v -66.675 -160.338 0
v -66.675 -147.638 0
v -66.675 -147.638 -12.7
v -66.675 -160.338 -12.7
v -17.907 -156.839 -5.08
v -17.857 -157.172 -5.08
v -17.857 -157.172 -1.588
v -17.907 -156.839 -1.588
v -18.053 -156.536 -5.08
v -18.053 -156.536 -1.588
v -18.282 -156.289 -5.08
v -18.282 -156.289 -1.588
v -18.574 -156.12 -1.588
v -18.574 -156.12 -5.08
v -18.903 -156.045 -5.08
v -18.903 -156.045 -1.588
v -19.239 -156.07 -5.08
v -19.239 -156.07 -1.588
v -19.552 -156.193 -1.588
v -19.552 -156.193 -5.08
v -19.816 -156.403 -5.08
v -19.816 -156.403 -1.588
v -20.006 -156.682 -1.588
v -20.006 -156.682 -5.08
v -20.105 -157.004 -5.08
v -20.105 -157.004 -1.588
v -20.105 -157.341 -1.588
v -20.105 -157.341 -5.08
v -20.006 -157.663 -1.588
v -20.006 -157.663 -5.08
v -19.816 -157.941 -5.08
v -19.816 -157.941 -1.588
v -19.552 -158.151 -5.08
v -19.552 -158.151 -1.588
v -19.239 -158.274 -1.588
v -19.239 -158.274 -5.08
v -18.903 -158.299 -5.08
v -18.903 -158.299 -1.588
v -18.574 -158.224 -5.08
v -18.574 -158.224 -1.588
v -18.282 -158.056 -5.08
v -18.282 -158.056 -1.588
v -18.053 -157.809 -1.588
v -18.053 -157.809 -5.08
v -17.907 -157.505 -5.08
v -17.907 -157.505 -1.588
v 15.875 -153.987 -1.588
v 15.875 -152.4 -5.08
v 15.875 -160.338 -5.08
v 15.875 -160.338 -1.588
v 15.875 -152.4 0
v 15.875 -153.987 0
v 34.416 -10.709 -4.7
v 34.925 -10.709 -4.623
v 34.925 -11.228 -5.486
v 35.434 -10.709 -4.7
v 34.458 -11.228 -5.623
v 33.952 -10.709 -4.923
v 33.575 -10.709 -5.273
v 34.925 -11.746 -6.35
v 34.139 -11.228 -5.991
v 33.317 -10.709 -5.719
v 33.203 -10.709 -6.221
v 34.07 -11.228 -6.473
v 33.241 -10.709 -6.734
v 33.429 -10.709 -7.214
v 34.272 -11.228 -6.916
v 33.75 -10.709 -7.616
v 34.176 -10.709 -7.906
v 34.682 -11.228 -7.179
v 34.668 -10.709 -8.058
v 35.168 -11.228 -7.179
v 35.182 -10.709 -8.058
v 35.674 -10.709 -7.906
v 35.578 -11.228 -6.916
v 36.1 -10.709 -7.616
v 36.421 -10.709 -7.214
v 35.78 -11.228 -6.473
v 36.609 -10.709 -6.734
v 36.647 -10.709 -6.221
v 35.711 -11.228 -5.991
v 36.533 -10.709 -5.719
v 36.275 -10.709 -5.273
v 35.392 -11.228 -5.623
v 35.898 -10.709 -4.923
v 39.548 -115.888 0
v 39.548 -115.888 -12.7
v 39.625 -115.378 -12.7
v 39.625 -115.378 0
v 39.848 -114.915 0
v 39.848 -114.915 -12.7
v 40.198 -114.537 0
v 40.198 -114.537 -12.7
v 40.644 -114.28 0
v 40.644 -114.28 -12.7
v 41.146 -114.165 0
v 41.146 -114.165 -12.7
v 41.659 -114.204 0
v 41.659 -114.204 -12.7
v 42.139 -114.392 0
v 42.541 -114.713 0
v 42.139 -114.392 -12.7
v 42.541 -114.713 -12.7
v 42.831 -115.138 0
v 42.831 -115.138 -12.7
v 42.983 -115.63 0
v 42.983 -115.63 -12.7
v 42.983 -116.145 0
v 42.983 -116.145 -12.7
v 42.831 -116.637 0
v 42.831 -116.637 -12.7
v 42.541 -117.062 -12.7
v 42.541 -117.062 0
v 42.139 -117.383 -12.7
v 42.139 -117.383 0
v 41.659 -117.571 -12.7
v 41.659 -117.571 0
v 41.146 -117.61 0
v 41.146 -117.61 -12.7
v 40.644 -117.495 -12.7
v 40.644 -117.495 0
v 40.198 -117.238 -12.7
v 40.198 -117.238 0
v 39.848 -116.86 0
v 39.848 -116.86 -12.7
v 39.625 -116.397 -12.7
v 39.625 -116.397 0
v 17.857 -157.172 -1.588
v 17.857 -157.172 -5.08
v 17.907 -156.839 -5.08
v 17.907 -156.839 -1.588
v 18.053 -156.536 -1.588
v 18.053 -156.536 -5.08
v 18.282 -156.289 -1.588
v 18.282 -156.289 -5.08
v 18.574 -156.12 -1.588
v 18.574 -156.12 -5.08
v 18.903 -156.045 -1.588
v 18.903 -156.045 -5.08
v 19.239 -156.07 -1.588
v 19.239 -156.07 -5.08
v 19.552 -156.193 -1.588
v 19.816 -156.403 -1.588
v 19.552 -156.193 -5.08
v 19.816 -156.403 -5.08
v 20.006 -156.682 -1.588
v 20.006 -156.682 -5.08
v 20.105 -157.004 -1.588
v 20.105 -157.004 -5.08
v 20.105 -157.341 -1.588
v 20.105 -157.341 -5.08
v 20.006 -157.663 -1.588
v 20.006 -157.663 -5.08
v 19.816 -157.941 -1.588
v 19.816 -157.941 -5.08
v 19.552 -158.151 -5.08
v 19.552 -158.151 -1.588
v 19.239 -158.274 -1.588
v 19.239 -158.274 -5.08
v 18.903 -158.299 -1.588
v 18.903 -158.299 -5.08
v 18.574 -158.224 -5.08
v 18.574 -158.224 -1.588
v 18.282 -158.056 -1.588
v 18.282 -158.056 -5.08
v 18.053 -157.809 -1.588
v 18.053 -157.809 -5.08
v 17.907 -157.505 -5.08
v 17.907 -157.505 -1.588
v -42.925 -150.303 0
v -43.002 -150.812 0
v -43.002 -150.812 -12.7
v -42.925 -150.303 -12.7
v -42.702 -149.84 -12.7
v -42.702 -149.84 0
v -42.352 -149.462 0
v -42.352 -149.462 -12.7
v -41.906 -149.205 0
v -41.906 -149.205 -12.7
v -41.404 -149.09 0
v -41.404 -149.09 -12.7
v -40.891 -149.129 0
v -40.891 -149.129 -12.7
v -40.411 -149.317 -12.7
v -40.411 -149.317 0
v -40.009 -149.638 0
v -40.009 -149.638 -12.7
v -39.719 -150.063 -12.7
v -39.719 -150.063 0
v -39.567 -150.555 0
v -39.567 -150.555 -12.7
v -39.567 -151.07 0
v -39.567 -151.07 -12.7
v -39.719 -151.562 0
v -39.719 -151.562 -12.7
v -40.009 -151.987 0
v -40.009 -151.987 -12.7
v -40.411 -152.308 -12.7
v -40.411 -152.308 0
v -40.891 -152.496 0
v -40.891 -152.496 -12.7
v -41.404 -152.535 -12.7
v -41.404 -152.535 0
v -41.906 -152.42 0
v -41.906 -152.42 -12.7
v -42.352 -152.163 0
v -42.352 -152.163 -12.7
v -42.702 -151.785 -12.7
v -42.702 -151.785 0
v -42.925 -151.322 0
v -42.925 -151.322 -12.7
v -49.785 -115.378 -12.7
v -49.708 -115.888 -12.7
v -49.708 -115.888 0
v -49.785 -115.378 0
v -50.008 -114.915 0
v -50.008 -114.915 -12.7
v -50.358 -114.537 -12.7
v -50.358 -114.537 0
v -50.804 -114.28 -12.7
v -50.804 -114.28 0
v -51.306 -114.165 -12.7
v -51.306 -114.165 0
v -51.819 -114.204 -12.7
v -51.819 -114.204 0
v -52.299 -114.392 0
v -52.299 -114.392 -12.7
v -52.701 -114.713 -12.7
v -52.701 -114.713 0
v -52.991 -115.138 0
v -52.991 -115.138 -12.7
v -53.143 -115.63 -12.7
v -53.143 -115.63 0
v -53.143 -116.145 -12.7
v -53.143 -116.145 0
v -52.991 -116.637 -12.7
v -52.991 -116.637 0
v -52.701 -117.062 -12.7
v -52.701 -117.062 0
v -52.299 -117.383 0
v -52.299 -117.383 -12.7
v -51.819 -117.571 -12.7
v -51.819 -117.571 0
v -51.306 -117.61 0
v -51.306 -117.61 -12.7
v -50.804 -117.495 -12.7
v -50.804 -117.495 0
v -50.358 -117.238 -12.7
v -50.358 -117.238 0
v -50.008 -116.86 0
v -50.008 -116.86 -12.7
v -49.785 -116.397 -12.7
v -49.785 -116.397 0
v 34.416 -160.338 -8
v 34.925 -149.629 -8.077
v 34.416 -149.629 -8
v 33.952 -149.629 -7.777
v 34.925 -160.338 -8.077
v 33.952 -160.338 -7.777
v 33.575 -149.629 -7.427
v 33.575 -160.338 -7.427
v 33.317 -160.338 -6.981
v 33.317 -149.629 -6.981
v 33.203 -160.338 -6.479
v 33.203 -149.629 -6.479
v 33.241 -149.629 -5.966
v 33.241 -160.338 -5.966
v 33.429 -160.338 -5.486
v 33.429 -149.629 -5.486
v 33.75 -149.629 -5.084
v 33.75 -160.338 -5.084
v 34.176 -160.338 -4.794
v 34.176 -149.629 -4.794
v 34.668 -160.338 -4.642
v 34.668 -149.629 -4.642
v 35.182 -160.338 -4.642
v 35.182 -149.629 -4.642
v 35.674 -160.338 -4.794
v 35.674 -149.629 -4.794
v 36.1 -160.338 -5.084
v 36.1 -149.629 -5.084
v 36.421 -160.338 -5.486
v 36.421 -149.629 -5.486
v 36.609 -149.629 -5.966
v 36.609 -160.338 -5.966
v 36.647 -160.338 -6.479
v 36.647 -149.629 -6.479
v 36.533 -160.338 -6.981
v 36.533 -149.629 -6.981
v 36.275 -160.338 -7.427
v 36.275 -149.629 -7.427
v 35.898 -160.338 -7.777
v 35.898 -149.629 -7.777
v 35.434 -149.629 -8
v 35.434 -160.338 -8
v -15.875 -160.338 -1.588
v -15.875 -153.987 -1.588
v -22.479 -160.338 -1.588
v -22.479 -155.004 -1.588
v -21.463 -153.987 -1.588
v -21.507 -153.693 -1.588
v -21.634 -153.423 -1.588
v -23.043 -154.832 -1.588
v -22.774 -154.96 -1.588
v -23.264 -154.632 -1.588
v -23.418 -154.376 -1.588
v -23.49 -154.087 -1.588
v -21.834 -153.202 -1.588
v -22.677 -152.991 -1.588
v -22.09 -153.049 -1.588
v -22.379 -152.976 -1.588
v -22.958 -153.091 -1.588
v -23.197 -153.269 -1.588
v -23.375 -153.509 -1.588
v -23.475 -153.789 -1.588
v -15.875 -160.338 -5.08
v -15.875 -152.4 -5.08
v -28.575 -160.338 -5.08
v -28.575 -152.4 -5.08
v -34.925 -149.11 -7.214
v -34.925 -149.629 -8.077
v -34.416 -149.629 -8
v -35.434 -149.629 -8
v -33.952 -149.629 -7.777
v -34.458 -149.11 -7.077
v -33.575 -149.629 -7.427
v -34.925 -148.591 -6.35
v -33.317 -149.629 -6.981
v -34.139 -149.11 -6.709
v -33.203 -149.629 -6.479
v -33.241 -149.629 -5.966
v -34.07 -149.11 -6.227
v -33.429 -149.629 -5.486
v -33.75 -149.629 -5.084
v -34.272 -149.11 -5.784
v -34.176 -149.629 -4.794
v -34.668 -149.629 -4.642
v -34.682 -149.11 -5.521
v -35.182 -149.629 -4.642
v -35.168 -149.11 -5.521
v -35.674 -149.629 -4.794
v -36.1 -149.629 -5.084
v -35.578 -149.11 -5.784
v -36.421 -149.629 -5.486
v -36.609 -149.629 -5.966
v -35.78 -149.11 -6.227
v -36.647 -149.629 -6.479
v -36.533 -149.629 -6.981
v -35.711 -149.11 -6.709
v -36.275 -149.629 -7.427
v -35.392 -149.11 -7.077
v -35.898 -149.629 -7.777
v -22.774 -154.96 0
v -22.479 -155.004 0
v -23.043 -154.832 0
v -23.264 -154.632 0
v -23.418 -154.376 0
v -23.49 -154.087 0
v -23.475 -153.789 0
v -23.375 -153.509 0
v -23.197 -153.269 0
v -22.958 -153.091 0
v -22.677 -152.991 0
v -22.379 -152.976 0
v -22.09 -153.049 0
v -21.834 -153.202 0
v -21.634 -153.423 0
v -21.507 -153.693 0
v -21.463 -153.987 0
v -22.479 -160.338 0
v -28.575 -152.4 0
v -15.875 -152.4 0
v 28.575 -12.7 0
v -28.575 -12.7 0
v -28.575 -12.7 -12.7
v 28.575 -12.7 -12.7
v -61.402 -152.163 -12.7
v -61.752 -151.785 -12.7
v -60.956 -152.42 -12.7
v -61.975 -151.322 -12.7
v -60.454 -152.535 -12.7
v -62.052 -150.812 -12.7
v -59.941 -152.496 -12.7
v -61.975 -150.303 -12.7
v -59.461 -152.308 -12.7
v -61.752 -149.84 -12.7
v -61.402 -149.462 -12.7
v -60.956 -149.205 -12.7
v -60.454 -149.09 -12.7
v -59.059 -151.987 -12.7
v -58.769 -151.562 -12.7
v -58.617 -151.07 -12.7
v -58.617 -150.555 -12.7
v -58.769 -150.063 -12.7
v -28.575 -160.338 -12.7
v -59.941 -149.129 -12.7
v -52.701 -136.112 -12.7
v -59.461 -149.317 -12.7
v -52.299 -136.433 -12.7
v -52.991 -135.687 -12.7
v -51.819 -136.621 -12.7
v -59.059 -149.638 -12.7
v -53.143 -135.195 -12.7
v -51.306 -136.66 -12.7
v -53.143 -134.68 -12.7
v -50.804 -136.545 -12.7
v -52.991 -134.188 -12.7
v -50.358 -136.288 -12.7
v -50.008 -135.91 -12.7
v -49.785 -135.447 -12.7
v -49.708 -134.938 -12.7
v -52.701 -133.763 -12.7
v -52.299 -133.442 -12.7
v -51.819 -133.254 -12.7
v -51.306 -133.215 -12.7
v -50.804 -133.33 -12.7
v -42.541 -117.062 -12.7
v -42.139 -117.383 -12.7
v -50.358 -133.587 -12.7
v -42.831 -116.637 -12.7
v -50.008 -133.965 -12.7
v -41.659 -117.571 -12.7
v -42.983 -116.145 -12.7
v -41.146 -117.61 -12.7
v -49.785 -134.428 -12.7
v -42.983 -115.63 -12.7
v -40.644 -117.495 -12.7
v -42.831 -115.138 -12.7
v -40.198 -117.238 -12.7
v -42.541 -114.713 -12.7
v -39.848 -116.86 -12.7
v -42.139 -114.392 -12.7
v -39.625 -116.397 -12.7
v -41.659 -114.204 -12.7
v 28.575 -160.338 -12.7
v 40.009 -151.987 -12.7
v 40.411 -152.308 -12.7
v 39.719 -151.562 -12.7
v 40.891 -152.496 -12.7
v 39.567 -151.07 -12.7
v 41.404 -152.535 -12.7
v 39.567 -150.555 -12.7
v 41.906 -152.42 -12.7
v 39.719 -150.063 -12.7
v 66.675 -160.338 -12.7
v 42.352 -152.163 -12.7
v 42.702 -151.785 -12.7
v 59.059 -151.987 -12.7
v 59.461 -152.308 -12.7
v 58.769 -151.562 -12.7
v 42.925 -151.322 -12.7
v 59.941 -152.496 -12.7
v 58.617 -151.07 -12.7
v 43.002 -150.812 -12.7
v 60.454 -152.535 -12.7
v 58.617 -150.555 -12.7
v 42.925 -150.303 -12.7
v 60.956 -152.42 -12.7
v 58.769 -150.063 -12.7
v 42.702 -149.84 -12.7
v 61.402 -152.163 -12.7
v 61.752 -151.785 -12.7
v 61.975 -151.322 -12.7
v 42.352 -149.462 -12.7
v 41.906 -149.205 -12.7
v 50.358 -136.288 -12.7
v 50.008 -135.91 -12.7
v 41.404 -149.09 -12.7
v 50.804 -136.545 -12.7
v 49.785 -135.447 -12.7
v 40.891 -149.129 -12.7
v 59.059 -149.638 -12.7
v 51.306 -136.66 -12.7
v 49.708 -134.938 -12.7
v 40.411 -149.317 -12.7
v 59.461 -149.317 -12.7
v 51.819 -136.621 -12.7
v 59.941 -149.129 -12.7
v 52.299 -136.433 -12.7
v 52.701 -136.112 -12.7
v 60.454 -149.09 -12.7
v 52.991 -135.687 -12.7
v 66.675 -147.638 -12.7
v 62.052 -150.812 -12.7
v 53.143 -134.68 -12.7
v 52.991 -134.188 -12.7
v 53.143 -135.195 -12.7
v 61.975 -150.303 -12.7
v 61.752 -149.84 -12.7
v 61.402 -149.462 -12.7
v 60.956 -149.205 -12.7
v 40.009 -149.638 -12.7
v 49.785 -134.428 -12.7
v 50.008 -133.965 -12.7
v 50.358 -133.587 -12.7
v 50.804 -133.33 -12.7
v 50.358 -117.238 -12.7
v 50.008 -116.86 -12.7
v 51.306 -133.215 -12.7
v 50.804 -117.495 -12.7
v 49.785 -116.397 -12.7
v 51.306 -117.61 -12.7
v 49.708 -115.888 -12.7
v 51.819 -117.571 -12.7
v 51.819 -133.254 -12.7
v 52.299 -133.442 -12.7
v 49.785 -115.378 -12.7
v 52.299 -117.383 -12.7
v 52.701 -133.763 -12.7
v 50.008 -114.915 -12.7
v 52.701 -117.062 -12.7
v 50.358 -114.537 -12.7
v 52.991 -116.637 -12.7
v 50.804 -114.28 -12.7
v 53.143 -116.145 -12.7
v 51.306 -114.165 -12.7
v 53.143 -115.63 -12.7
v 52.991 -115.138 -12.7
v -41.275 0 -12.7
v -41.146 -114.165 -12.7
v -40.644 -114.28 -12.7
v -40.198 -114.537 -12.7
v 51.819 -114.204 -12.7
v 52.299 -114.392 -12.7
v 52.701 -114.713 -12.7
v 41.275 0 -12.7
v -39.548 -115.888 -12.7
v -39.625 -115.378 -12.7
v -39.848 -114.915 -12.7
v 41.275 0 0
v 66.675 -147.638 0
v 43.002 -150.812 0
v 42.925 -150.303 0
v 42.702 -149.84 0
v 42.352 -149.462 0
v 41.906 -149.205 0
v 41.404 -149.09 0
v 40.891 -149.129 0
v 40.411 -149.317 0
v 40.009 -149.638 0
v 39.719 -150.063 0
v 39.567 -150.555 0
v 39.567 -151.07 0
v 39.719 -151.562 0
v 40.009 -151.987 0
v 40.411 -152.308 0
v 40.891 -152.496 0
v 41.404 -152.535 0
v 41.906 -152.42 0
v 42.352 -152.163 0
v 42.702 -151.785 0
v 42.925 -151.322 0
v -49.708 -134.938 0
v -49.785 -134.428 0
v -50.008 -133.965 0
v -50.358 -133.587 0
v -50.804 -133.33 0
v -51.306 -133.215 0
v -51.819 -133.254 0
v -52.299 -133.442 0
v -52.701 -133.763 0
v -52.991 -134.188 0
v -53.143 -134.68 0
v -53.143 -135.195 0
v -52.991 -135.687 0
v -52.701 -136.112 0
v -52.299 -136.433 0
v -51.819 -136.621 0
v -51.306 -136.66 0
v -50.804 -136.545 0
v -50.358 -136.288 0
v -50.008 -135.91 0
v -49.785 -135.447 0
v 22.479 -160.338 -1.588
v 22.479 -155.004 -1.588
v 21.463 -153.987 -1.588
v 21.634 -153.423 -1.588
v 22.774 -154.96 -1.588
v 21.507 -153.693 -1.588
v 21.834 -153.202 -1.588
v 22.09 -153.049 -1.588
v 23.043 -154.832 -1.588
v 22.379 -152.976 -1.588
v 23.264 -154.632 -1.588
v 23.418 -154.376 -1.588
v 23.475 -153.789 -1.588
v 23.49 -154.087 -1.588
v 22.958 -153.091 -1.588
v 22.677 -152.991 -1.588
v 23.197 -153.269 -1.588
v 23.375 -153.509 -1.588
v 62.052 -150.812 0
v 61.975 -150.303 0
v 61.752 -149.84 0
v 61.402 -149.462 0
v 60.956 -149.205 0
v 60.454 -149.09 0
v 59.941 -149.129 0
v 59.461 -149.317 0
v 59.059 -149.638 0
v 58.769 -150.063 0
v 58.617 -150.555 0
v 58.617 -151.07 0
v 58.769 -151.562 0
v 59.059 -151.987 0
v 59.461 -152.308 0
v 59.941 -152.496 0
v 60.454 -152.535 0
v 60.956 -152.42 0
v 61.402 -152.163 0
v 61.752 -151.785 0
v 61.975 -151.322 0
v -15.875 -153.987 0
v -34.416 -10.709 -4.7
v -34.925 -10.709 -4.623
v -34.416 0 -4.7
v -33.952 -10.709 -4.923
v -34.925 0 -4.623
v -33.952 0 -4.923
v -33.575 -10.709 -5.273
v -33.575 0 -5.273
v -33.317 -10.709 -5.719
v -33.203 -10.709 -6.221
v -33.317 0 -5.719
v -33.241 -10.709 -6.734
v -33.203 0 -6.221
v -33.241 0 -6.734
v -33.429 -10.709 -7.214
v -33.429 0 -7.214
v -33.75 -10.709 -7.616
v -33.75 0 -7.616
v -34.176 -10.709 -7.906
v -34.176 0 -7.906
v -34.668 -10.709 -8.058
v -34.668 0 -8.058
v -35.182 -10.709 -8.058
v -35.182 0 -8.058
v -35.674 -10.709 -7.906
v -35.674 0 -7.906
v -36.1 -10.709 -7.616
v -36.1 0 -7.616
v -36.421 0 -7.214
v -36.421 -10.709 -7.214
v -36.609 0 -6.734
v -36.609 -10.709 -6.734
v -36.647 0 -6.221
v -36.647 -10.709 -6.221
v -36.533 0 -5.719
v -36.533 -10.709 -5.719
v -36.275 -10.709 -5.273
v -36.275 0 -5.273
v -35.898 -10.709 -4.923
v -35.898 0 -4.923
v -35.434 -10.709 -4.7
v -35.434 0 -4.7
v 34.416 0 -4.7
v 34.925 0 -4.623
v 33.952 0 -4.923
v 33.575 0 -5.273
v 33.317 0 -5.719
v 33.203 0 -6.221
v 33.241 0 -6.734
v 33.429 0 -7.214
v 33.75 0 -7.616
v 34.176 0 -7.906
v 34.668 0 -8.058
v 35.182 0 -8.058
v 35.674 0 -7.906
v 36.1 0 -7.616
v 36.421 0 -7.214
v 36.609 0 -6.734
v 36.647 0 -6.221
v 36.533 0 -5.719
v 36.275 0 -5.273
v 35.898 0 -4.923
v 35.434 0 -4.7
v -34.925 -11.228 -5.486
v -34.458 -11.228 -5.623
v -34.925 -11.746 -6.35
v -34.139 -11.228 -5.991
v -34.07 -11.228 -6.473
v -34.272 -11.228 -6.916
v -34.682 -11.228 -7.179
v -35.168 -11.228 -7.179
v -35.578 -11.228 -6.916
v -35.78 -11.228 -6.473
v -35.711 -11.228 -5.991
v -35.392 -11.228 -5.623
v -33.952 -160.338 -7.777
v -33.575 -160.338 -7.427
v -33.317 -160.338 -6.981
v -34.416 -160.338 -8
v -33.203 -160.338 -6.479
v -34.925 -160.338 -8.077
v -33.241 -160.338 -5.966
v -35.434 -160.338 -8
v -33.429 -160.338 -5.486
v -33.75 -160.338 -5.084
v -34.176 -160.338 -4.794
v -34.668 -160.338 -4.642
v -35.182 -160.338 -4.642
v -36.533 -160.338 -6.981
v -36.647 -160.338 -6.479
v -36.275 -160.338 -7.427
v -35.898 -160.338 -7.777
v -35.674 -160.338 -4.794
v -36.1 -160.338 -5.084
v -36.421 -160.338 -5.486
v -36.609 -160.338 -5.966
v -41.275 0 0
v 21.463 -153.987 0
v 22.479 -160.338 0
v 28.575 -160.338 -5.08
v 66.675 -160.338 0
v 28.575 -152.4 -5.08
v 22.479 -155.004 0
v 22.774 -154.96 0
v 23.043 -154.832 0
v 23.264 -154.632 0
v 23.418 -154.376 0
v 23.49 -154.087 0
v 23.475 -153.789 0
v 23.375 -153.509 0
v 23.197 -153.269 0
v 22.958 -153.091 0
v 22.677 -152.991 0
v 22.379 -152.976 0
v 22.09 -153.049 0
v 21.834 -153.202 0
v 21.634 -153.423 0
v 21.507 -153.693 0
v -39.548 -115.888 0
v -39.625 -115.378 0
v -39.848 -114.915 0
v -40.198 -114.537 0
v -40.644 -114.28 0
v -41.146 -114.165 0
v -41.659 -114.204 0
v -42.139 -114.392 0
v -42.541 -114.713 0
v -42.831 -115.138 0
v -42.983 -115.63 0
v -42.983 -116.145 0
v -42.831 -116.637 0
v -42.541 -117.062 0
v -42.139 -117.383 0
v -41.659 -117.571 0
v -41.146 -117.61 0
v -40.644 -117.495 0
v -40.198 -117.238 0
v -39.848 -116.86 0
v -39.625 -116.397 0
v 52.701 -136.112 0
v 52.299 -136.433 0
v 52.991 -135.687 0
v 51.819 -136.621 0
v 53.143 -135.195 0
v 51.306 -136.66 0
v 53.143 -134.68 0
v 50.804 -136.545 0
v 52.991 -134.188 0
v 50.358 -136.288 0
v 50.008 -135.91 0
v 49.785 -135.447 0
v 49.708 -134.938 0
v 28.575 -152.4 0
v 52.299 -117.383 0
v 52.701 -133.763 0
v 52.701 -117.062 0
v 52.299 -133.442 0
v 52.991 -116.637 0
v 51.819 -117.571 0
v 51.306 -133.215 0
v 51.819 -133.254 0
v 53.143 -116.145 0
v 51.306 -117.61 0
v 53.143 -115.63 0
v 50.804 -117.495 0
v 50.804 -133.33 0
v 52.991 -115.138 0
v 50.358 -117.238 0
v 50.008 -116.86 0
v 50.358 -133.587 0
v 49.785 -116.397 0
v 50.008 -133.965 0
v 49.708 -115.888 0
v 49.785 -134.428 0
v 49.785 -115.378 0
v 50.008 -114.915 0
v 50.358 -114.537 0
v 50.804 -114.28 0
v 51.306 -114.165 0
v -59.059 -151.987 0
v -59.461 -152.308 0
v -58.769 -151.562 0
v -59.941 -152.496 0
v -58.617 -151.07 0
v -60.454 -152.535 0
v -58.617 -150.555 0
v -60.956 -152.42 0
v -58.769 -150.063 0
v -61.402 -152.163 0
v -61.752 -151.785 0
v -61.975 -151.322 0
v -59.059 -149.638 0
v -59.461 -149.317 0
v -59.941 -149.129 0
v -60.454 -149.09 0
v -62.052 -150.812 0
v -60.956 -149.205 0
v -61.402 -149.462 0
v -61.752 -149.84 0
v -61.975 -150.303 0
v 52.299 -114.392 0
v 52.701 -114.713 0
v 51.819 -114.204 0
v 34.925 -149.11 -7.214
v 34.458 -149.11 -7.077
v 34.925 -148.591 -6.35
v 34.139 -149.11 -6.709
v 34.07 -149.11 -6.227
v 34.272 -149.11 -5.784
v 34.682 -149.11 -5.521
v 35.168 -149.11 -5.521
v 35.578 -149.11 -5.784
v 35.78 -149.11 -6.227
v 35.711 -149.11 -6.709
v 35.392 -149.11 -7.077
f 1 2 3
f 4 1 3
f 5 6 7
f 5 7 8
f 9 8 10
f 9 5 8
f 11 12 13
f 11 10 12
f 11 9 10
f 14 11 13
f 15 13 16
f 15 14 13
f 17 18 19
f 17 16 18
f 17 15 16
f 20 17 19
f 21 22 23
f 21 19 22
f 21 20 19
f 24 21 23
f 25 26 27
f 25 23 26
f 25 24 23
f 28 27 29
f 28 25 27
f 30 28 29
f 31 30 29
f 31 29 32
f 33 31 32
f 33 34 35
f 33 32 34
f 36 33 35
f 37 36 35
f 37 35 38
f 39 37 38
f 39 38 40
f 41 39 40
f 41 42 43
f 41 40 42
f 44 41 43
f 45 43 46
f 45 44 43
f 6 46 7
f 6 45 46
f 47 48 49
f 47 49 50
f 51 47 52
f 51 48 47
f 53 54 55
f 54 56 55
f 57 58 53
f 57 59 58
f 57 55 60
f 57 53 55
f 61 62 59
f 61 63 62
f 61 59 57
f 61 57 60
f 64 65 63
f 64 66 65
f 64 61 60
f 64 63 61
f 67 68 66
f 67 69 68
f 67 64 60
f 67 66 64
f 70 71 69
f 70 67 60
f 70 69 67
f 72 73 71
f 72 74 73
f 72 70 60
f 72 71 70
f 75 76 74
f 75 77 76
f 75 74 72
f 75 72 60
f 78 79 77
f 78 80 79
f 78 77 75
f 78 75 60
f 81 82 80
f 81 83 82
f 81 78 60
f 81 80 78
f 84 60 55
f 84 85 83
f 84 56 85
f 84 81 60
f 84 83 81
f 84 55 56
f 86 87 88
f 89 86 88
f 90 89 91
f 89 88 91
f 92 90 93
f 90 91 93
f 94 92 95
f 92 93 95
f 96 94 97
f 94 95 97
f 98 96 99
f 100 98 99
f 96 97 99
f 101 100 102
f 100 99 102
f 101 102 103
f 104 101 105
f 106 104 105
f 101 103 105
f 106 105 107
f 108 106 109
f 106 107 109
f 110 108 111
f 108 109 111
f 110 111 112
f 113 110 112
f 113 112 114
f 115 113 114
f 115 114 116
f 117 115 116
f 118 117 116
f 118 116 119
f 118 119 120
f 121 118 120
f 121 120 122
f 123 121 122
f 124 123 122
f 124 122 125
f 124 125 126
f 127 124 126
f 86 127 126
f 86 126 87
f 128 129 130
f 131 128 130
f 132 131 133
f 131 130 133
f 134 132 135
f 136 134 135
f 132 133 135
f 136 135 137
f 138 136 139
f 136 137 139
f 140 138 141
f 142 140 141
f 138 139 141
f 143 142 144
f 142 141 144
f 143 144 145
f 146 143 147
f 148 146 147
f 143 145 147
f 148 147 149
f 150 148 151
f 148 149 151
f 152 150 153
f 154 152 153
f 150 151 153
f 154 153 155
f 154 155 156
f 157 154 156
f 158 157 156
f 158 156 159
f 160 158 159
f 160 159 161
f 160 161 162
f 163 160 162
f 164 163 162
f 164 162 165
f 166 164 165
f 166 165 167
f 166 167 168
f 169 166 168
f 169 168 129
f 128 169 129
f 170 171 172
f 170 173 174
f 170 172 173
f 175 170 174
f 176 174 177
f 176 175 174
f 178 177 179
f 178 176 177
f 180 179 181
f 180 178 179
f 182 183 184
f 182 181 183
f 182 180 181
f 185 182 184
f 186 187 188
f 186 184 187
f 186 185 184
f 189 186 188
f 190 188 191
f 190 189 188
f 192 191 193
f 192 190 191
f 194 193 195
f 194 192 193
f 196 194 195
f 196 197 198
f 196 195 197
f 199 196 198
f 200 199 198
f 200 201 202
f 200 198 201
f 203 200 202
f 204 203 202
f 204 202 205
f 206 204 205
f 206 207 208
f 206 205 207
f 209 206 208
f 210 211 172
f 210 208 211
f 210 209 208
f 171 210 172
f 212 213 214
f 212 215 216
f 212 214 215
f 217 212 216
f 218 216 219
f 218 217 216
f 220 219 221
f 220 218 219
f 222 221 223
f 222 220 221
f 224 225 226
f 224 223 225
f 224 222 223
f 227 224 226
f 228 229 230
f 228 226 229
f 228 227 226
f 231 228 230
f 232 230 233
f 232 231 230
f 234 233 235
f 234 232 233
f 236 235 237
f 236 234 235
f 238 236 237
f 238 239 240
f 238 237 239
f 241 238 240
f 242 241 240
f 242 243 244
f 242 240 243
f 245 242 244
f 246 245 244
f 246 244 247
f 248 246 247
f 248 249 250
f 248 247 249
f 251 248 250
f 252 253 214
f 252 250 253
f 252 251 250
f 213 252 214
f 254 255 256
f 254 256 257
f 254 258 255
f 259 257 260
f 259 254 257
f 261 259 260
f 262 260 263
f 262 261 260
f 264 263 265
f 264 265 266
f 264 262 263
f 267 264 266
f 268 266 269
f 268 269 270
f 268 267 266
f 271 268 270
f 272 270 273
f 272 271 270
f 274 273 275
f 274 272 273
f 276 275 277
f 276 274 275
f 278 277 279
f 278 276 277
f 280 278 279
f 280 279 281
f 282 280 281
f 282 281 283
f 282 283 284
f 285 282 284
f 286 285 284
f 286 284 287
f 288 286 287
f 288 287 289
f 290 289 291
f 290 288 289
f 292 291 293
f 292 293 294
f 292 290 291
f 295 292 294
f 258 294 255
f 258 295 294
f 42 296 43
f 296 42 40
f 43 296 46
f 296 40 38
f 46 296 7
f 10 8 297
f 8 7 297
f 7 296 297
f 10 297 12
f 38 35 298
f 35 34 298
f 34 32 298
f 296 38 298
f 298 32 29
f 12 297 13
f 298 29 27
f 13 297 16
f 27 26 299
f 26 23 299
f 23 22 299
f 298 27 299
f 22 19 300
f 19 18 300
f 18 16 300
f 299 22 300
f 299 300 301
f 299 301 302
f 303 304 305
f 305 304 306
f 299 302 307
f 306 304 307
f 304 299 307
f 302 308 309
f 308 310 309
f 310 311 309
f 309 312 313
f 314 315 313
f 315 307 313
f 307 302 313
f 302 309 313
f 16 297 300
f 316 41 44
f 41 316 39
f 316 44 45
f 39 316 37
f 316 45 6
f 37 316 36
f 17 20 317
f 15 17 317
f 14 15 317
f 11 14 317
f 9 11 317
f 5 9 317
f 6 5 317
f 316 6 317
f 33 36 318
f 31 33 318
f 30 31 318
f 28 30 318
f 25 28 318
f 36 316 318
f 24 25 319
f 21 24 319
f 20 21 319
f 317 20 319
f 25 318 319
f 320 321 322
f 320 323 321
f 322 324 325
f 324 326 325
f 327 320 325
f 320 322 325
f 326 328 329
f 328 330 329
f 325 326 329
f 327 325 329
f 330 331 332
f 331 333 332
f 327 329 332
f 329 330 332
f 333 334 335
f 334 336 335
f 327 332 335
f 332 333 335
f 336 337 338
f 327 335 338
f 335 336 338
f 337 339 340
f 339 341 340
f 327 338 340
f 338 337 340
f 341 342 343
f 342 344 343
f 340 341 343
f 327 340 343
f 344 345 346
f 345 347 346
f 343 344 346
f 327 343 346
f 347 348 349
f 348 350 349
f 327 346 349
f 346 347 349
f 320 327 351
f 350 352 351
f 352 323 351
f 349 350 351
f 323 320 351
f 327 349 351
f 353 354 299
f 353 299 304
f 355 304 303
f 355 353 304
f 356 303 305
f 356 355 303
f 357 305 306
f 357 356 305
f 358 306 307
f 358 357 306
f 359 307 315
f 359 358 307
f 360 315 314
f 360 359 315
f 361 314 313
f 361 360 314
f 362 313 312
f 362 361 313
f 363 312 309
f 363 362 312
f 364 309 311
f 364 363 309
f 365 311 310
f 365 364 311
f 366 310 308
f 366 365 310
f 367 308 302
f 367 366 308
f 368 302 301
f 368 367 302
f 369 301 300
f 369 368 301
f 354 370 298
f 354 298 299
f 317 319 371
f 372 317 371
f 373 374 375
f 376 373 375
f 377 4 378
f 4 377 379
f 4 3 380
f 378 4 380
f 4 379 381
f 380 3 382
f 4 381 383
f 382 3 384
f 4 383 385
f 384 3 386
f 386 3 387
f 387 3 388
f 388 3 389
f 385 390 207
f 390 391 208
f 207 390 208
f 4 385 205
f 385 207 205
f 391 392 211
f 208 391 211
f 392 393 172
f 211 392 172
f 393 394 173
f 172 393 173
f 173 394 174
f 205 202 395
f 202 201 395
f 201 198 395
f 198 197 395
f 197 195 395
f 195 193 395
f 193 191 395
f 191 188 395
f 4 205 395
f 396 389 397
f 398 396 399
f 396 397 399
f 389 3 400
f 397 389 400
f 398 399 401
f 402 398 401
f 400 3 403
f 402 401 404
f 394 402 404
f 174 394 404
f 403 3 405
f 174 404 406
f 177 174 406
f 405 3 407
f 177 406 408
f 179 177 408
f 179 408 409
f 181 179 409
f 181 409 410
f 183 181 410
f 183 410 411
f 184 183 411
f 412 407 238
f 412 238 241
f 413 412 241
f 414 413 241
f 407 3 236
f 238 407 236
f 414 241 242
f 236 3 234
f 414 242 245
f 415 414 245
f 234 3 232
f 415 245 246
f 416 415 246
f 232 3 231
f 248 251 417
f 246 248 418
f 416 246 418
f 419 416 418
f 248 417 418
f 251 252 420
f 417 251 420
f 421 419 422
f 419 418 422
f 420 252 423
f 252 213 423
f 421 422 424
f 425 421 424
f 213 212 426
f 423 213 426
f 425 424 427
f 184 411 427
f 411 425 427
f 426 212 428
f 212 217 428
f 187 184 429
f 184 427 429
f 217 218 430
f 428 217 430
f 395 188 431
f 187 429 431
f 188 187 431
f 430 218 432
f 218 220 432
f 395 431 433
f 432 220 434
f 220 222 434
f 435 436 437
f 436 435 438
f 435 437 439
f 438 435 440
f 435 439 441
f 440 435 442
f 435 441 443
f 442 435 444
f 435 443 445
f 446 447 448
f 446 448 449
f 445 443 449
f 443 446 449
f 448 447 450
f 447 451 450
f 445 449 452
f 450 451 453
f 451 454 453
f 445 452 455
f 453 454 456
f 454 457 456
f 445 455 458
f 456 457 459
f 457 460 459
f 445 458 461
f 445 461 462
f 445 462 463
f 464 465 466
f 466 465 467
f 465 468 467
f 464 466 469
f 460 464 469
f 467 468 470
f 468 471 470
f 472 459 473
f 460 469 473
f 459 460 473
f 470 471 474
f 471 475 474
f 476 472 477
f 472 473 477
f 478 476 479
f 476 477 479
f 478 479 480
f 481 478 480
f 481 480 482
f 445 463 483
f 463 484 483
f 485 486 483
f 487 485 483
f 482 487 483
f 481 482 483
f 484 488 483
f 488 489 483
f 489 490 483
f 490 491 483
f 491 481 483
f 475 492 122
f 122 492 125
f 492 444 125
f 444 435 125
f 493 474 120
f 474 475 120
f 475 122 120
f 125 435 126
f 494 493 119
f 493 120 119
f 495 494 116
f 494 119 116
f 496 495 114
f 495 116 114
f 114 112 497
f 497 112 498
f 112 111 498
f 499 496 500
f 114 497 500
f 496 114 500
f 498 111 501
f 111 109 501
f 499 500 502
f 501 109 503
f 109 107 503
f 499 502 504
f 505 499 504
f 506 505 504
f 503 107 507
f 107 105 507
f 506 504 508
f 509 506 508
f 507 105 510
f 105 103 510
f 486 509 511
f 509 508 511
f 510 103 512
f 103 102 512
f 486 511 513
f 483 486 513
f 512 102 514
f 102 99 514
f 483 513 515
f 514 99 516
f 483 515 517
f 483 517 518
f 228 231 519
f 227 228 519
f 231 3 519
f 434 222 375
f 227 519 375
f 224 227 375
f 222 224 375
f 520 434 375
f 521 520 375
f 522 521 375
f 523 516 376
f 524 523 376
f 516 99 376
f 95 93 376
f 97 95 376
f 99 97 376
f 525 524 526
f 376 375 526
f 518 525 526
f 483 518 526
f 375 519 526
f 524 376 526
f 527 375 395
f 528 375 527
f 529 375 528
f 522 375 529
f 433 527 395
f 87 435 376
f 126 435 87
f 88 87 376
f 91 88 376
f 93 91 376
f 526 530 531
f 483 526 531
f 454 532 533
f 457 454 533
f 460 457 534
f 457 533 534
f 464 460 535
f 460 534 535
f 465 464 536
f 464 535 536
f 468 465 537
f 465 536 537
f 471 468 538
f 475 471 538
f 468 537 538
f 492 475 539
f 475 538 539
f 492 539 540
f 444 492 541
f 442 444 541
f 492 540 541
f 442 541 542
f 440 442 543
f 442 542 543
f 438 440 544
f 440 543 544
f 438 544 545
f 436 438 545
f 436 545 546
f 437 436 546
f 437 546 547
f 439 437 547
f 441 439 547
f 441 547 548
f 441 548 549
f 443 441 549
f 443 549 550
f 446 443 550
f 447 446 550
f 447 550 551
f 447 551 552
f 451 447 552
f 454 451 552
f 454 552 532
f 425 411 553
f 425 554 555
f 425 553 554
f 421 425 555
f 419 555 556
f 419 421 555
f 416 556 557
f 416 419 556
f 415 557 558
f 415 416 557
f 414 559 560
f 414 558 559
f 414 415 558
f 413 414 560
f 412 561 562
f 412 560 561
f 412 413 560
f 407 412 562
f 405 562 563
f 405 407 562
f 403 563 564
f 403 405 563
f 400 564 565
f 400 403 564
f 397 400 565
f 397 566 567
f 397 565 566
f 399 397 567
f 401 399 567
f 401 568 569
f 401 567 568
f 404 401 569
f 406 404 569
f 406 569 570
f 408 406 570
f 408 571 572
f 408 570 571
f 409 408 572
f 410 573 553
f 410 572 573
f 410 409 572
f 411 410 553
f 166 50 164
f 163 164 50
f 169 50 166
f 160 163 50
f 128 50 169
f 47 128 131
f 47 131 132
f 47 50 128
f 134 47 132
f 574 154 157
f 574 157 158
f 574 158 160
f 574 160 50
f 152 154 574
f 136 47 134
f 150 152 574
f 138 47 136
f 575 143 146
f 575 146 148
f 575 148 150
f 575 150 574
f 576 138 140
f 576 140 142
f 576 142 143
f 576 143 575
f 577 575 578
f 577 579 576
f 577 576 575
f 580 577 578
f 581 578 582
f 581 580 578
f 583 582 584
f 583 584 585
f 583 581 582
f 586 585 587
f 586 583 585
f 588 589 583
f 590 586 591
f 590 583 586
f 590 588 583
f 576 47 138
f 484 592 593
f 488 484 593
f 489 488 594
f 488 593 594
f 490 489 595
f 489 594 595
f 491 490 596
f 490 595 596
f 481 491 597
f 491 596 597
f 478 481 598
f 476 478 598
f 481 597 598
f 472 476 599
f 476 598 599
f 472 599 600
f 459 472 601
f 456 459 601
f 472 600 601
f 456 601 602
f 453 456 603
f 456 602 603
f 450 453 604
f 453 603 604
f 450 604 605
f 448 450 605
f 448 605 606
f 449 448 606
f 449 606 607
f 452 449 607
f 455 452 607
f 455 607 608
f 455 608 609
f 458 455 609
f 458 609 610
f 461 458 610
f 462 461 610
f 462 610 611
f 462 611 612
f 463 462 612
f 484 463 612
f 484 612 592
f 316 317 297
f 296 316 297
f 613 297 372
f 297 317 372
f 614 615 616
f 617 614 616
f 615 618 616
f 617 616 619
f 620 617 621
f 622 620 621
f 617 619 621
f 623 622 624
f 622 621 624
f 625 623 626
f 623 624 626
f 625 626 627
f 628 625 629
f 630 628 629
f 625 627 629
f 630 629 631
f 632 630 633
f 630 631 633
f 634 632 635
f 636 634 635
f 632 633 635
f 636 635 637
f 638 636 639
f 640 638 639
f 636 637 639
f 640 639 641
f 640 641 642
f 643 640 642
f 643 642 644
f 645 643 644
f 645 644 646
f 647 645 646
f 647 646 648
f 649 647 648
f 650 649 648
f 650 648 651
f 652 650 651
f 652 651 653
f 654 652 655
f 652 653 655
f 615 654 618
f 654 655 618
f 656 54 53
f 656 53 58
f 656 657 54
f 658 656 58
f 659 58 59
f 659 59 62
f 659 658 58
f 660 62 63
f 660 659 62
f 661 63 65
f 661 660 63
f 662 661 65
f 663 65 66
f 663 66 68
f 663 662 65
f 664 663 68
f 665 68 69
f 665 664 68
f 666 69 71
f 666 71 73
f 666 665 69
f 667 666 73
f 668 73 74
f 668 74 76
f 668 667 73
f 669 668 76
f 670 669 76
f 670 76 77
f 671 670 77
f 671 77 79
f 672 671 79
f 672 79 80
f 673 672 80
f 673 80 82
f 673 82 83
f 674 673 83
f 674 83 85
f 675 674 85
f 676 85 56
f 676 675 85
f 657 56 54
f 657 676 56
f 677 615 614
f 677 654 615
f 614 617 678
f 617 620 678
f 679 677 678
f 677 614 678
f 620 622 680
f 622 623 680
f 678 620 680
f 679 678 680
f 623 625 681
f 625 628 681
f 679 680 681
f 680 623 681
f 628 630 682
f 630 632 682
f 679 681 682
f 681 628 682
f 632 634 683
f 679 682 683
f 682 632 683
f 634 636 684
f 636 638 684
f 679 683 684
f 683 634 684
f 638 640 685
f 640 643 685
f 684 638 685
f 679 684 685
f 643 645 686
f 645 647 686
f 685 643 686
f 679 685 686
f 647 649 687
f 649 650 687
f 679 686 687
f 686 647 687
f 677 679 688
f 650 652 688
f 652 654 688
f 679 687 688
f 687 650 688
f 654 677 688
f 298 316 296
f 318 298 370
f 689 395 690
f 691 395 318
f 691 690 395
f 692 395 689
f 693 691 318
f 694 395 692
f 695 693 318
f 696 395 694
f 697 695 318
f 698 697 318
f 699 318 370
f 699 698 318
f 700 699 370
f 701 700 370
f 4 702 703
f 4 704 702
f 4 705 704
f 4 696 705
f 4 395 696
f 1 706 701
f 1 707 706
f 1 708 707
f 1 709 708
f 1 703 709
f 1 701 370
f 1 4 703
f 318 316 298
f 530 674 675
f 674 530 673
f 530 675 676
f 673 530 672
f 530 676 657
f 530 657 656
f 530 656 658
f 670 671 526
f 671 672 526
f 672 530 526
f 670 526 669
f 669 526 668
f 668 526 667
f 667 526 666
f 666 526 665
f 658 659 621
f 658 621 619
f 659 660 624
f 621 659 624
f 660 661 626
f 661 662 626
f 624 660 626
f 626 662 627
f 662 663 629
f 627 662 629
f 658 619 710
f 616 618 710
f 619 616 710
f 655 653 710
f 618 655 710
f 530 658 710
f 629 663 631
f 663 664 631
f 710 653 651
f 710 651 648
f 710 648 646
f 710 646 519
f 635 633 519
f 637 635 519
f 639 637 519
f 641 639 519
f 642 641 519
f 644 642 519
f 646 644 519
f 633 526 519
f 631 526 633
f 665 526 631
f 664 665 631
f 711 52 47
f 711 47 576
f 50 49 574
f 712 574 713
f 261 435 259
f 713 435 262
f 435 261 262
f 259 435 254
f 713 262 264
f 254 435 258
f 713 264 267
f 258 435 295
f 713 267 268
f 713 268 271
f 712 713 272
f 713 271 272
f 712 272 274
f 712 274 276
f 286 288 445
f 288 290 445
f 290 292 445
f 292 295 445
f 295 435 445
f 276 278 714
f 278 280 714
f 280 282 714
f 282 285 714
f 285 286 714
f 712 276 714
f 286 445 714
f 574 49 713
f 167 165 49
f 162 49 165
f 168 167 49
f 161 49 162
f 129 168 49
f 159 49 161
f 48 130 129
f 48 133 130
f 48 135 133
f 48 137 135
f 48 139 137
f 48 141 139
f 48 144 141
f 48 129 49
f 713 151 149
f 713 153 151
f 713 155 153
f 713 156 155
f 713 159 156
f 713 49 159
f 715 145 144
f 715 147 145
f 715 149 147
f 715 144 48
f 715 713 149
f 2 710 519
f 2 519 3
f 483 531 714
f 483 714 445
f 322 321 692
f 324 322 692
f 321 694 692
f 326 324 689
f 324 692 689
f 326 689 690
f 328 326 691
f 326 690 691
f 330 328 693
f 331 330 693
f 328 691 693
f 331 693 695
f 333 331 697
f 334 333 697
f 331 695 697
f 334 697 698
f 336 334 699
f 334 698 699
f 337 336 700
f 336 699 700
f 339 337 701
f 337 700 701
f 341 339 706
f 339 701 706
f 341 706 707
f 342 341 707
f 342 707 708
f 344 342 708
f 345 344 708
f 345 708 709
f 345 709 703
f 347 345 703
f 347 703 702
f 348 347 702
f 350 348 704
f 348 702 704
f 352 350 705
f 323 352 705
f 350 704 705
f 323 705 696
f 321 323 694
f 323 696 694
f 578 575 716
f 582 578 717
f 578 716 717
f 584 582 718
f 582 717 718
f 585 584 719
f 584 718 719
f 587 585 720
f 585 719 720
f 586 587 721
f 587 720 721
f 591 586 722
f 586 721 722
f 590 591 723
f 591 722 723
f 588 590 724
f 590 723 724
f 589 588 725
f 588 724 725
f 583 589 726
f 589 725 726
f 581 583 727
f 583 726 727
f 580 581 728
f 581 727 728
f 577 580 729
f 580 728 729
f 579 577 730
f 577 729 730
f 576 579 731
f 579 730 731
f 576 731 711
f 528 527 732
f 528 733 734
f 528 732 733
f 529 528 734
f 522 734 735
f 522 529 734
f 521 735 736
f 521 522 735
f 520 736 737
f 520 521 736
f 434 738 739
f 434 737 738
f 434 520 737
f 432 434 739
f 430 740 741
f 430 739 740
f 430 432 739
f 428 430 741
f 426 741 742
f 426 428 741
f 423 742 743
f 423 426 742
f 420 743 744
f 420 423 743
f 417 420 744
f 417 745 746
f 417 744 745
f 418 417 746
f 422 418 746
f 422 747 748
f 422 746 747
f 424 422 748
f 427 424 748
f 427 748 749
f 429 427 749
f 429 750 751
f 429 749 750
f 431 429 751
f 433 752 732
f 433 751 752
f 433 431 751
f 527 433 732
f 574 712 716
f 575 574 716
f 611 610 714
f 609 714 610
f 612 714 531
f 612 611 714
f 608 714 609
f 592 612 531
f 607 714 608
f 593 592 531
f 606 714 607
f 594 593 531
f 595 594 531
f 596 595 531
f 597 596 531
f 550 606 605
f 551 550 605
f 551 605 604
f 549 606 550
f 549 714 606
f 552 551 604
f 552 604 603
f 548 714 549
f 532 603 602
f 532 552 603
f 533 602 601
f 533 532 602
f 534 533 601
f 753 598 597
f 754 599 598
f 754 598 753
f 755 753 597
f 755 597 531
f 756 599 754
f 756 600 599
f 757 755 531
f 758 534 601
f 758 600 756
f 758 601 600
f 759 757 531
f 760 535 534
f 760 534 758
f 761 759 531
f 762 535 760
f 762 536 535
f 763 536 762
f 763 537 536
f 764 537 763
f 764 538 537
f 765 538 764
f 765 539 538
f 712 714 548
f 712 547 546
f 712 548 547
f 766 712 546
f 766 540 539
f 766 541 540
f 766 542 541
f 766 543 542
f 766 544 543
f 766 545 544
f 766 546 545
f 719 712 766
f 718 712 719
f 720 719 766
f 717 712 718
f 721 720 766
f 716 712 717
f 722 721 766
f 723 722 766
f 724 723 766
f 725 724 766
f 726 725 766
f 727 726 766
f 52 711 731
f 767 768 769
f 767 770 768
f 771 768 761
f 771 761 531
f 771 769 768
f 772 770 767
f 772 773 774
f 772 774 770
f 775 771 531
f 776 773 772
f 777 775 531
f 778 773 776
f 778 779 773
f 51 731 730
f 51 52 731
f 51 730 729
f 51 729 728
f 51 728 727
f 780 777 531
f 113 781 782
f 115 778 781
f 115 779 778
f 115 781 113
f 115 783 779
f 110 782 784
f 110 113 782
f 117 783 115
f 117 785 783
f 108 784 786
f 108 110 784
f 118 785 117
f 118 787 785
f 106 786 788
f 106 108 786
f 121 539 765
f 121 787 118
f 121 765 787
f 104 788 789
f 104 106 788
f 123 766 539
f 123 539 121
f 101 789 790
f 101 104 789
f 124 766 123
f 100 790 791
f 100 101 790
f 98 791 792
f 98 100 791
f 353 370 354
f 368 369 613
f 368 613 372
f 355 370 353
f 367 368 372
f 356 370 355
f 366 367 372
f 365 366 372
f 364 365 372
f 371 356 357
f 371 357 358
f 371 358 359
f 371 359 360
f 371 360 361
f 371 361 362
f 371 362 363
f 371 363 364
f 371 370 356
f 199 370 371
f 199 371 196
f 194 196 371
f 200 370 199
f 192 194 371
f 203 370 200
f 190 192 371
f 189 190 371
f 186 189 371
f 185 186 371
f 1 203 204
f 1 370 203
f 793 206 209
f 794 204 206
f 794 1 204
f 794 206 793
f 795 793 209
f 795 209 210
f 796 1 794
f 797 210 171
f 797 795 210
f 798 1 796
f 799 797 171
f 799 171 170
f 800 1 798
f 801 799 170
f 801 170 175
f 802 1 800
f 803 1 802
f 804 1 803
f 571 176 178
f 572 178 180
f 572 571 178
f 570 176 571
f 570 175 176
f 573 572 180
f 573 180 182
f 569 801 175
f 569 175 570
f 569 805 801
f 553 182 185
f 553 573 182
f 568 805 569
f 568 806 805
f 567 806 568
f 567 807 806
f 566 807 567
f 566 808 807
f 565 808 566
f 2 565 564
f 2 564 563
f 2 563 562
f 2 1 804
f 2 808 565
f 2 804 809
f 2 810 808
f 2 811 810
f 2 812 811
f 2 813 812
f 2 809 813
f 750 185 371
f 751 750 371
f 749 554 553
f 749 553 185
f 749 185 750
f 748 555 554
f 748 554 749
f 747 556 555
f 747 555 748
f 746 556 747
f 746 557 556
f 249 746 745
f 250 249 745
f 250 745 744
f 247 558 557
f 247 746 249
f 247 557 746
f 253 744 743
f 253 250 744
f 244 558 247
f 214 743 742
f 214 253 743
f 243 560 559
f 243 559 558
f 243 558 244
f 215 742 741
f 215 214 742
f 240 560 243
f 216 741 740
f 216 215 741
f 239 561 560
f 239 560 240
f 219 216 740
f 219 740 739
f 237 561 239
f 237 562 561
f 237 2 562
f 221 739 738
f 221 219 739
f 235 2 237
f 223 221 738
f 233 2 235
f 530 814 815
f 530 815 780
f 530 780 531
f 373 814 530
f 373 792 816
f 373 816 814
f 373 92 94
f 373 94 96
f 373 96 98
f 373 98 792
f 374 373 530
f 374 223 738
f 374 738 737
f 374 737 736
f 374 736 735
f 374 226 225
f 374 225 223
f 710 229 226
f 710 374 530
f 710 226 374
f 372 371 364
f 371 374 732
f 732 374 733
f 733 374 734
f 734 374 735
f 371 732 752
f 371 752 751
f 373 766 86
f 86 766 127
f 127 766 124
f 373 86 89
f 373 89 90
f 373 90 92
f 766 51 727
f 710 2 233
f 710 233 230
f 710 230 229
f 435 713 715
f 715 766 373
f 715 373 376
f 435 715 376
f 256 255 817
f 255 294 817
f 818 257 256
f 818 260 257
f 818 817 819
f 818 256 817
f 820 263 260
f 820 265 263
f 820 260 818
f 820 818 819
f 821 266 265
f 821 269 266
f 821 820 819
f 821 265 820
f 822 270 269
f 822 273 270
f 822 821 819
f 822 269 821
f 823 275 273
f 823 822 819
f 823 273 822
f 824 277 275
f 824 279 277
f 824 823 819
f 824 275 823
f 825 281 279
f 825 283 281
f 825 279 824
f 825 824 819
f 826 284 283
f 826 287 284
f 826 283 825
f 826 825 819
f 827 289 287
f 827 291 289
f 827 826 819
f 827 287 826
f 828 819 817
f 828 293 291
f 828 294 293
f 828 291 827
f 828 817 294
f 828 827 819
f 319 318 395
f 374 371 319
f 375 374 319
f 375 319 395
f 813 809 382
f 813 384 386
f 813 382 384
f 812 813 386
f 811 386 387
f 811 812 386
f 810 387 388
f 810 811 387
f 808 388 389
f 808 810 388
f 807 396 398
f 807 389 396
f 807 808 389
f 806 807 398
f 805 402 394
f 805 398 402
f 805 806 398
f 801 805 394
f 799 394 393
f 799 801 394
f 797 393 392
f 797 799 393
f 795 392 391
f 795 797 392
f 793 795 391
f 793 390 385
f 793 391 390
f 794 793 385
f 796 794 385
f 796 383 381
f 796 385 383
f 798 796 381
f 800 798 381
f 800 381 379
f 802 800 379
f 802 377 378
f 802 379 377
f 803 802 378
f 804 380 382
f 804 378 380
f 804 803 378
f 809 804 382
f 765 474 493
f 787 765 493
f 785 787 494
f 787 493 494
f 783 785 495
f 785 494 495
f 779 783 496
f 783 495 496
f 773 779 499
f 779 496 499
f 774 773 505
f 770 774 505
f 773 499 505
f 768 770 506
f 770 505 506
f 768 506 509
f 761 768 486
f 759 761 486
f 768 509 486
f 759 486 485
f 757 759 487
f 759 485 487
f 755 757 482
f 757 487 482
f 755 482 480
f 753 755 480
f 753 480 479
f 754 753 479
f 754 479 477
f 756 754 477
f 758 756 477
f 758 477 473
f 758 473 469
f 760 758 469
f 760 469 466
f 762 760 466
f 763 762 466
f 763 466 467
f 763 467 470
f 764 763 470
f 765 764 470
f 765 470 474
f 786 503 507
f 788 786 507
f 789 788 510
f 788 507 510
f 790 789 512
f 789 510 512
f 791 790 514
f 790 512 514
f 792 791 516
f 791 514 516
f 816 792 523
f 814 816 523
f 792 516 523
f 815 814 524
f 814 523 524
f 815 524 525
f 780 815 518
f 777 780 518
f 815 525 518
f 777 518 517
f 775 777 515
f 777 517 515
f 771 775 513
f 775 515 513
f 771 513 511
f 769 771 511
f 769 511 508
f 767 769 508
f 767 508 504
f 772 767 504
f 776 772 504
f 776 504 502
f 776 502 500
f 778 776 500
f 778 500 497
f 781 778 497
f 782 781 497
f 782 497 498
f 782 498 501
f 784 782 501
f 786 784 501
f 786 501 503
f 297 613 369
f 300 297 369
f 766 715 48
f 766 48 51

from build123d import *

# Parameters (mm, degrees)
SKETCH1_W              = 12.7
SKETCH1_H              = 12.7
BOSS_EXTRUDE1_DEPTH    = 28.575
SKETCH10_W             = 12.7
SKETCH10_H             = 12.7
BOSS_EXTRUDE6_DEPTH    = 160.3375
SKETCH54_W             = 12.7
SKETCH54_H             = 12.7
BOSS_EXTRUDE10_DEPTH   = 25.4
BOSS_EXTRUDE11_DEPTH   = 12.7
F_8_32_TAPPED_HOLE11_D = 3.4544
F_8_32_TAPPED_HOLE12_D = 3.4544
SKETCH11_W             = 5.08
SKETCH11_H             = 7.9375
BOSS_EXTRUDE12_DEPTH   = 12.7
SKETCH68_W             = 6.604
SKETCH68_H             = 6.35
CUT_EXTRUDE4_DEPTH     = 1.5875
F_4_40_TAPPED_HOLE3_D  = 2.2606
SKETCH71_R             = 1.016
CUT_EXTRUDE5_DEPTH     = 1.5875
F_8_32_TAPPED_HOLE13_D = 3.4544


with BuildPart() as part:
    # Sketch1 → Boss-Extrude1 (new body)
    with BuildSketch(Plane(origin=(0, 0, 0), x_dir=(0, 0, -1), z_dir=(1, 0, 0))):
        with Locations((6.35, -6.35)):
            Rectangle(SKETCH1_W, SKETCH1_H)
    boss_extrude1 = extrude(amount=BOSS_EXTRUDE1_DEPTH)

    # Sketch10 → Boss-Extrude6 (add)
    with BuildSketch(Plane(origin=(0, 0, 0), x_dir=(1, 0, 0), z_dir=(0, 1, 0))):
        with Locations((34.925, 6.35)):
            Rectangle(SKETCH10_W, SKETCH10_H)
    boss_extrude6 = extrude(amount=-BOSS_EXTRUDE6_DEPTH)

    # Sketch54 → Boss-Extrude10 (add)
    with BuildSketch(Plane(origin=(41.275, 0, 0), x_dir=(0, 0, -1), z_dir=(1, 0, 0))):
        with Locations((6.35, -153.9875)):
            Rectangle(SKETCH54_W, SKETCH54_H)
    boss_extrude10 = extrude(amount=BOSS_EXTRUDE10_DEPTH)

    # Sketch55 → Boss-Extrude11 (add)
    with BuildSketch(Plane.XY):
        Polygon((41.275, 0), (66.675, -147.6375), (66.675, -160.3375), (28.575, -160.3375), (28.575, -12.7), (0, -12.7), (0, 0), align=None)
    boss_extrude11 = extrude(amount=-BOSS_EXTRUDE11_DEPTH)

    # Sketch56 → #8-32 Tapped Hole8 (revolve, cut)
    with BuildSketch(Plane(origin=(34.925, 0, -6.35), x_dir=(0, 0, 1), z_dir=(1, 0, 0))):
        Polygon((0, 0), (0, 11.746446461), (1.7272, 10.70864), (1.7272, 0), align=None)
    f_8_32_tapped_hole8 = revolve(axis=Axis((34.925, 6.35, -6.35), (0, -1, 0)), mode=Mode.SUBTRACT)

    # #8-32 Tapped Hole11 (through all)
    with Locations(Plane.XY):
        with Locations((41.275, -115.8875), (51.435, -134.9375)):
            f_8_32_tapped_hole11 = Hole(F_8_32_TAPPED_HOLE11_D / 2)

    # #8-32 Tapped Hole12 (through all)
    with Locations(Plane(origin=(0, 0, -12.7), x_dir=(-1, 0, 0), z_dir=(0, 0, -1))):
        with Locations((-41.275, -150.8125), (-60.325, -150.8125)):
            f_8_32_tapped_hole12 = Hole(F_8_32_TAPPED_HOLE12_D / 2)

    # Sketch11 → Boss-Extrude12 (add)
    with BuildSketch(Plane.ZY.offset(-28.575)):
        with Locations((-2.54, -156.36875)):
            Rectangle(SKETCH11_W, SKETCH11_H)
    boss_extrude12 = extrude(amount=BOSS_EXTRUDE12_DEPTH)

    # Sketch68 → Cut-Extrude4 (cut)
    with BuildSketch(Plane.XY):
        with Locations((19.177, -157.1625)):
            Rectangle(SKETCH68_W, SKETCH68_H)
    cut_extrude4 = extrude(amount=-CUT_EXTRUDE4_DEPTH, mode=Mode.SUBTRACT)

    # #4-40 Tapped Hole3 (through all)
    with Locations(Plane.XY.offset(-1.5875)):
        with Locations((18.987190852, -157.172283572)):
            f_4_40_tapped_hole3 = Hole(F_4_40_TAPPED_HOLE3_D / 2)

    # Sketch71 → Cut-Extrude5 (cut)
    with BuildSketch(Plane.XY):
        with Locations((22.479, -153.9875)):
            Circle(SKETCH71_R)
    cut_extrude5 = extrude(amount=-CUT_EXTRUDE5_DEPTH, mode=Mode.SUBTRACT)

    # Sketch76 → #8-32 Tapped Hole14 (revolve, cut)
    with BuildSketch(Plane(origin=(34.925, -160.3375, -6.35), x_dir=(0, 0, -1), z_dir=(1, 0, 0))):
        Polygon((0, 0), (0, 11.746446461), (1.7272, 10.70864), (1.7272, 0), align=None)
    f_8_32_tapped_hole14 = revolve(axis=Axis((34.925, -166.6875, -6.35), (0, 1, 0)), mode=Mode.SUBTRACT)

    # #8-32 Tapped Hole13 (through all)
    with Locations(Plane.XY):
        with Locations((51.435, -115.8875)):
            f_8_32_tapped_hole13 = Hole(F_8_32_TAPPED_HOLE13_D / 2)

    # Mirror6: Boss-Extrude1, Boss-Extrude6, Boss-Extrude10, Boss-Extrude11, #8-32 Tapped Hole8, #8-32 Tapped Hole11, #8-32 Tapped Hole12, Boss-Extrude12, Cut-Extrude4, #4-40 Tapped Hole3, Cut-Extrude5, #8-32 Tapped Hole14, #8-32 Tapped Hole13 across Right Plane
    add(boss_extrude1.mirror(Plane(origin=(0, 0, 0), x_dir=(0, 0, -1), z_dir=(1, 0, 0))))
    add(boss_extrude6.mirror(Plane(origin=(0, 0, 0), x_dir=(0, 0, -1), z_dir=(1, 0, 0))))
    add(boss_extrude10.mirror(Plane(origin=(0, 0, 0), x_dir=(0, 0, -1), z_dir=(1, 0, 0))))
    add(boss_extrude11.mirror(Plane(origin=(0, 0, 0), x_dir=(0, 0, -1), z_dir=(1, 0, 0))))
    add(f_8_32_tapped_hole8.mirror(Plane(origin=(0, 0, 0), x_dir=(0, 0, -1), z_dir=(1, 0, 0))), mode=Mode.SUBTRACT)
    add(f_8_32_tapped_hole11.mirror(Plane(origin=(0, 0, 0), x_dir=(0, 0, -1), z_dir=(1, 0, 0))), mode=Mode.SUBTRACT)
    add(f_8_32_tapped_hole12.mirror(Plane(origin=(0, 0, 0), x_dir=(0, 0, -1), z_dir=(1, 0, 0))), mode=Mode.SUBTRACT)
    add(boss_extrude12.mirror(Plane(origin=(0, 0, 0), x_dir=(0, 0, -1), z_dir=(1, 0, 0))))
    add(cut_extrude4.mirror(Plane(origin=(0, 0, 0), x_dir=(0, 0, -1), z_dir=(1, 0, 0))), mode=Mode.SUBTRACT)
    add(f_4_40_tapped_hole3.mirror(Plane(origin=(0, 0, 0), x_dir=(0, 0, -1), z_dir=(1, 0, 0))), mode=Mode.SUBTRACT)
    add(cut_extrude5.mirror(Plane(origin=(0, 0, 0), x_dir=(0, 0, -1), z_dir=(1, 0, 0))), mode=Mode.SUBTRACT)
    add(f_8_32_tapped_hole14.mirror(Plane(origin=(0, 0, 0), x_dir=(0, 0, -1), z_dir=(1, 0, 0))), mode=Mode.SUBTRACT)
    add(f_8_32_tapped_hole13.mirror(Plane(origin=(0, 0, 0), x_dir=(0, 0, -1), z_dir=(1, 0, 0))), mode=Mode.SUBTRACT)


solid = part.part
